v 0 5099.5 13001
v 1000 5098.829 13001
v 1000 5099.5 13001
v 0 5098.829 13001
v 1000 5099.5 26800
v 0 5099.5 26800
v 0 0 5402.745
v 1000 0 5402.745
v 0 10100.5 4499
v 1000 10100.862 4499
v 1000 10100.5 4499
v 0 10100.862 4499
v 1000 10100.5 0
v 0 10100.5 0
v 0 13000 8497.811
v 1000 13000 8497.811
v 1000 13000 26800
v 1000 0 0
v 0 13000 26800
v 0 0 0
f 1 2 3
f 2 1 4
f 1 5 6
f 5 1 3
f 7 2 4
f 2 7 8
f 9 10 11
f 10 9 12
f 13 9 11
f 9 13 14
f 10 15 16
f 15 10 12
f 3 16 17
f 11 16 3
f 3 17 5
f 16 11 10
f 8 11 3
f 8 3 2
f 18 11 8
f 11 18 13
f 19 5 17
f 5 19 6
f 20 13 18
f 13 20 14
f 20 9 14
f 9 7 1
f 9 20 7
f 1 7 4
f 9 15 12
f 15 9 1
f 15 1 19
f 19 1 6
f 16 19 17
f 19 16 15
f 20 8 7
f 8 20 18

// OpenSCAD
// file: ../common/triangle.scad
module triangle(o_len, a_len, depth, center=false) {
  centroid = center ? [-a_len/3, -o_len/3, -depth/2] : [0, 0, 0];
  translate(centroid) linear_extrude(height=depth) {
    polygon(points=[[0,0],[a_len,0],[0,o_len]], paths=[[0,1,2]]);
  }
}
// main file
use <../common/triangle.scad>;

GANTRY_BOTTOM_LENGTH = 10000;
GANTRY_FRONT_HEIGHT = 5400; // Triangle starts here.
GANTRY_FRONT_TRIANGLE_HEIGHT = 7600; // Height of the front triangle cutout.
GANTRY_FRONT_TRIANGLE_LENGTH = 5100;

GANTRY_FRONT_NARROW_START = GANTRY_FRONT_HEIGHT + GANTRY_FRONT_TRIANGLE_HEIGHT;
GANTRY_SIDE_BOTTOM_LENGTH = GANTRY_BOTTOM_LENGTH + 3000;

module GantrySide(thickness=1000, height=26800) {
  difference() {
    cube([thickness, GANTRY_SIDE_BOTTOM_LENGTH, height]);
    translate([-0.5, -0.5, 0]) {
      translate([0, 0, GANTRY_FRONT_NARROW_START + 1]) {
        cube([thickness + 1, GANTRY_FRONT_TRIANGLE_LENGTH, height - GANTRY_FRONT_NARROW_START]);
        translate([0, 0, 1]) rotate([0, 90, 0]) {
          triangle(o_len=GANTRY_FRONT_TRIANGLE_LENGTH, a_len=GANTRY_FRONT_TRIANGLE_HEIGHT, depth=thickness + 1);
        }
      }
      
      translate([0, GANTRY_BOTTOM_LENGTH + 100 + 1, -1]) {
        cube([thickness + 1, 2900, 4500]);
      }
      translate([0, GANTRY_SIDE_BOTTOM_LENGTH + 1, 4500 - 1.5]) {
        rotate([180, 270, 0]) triangle(o_len=2900, a_len=4000, depth=thickness + 1);
      }
    }
  }
}

GantrySide();
